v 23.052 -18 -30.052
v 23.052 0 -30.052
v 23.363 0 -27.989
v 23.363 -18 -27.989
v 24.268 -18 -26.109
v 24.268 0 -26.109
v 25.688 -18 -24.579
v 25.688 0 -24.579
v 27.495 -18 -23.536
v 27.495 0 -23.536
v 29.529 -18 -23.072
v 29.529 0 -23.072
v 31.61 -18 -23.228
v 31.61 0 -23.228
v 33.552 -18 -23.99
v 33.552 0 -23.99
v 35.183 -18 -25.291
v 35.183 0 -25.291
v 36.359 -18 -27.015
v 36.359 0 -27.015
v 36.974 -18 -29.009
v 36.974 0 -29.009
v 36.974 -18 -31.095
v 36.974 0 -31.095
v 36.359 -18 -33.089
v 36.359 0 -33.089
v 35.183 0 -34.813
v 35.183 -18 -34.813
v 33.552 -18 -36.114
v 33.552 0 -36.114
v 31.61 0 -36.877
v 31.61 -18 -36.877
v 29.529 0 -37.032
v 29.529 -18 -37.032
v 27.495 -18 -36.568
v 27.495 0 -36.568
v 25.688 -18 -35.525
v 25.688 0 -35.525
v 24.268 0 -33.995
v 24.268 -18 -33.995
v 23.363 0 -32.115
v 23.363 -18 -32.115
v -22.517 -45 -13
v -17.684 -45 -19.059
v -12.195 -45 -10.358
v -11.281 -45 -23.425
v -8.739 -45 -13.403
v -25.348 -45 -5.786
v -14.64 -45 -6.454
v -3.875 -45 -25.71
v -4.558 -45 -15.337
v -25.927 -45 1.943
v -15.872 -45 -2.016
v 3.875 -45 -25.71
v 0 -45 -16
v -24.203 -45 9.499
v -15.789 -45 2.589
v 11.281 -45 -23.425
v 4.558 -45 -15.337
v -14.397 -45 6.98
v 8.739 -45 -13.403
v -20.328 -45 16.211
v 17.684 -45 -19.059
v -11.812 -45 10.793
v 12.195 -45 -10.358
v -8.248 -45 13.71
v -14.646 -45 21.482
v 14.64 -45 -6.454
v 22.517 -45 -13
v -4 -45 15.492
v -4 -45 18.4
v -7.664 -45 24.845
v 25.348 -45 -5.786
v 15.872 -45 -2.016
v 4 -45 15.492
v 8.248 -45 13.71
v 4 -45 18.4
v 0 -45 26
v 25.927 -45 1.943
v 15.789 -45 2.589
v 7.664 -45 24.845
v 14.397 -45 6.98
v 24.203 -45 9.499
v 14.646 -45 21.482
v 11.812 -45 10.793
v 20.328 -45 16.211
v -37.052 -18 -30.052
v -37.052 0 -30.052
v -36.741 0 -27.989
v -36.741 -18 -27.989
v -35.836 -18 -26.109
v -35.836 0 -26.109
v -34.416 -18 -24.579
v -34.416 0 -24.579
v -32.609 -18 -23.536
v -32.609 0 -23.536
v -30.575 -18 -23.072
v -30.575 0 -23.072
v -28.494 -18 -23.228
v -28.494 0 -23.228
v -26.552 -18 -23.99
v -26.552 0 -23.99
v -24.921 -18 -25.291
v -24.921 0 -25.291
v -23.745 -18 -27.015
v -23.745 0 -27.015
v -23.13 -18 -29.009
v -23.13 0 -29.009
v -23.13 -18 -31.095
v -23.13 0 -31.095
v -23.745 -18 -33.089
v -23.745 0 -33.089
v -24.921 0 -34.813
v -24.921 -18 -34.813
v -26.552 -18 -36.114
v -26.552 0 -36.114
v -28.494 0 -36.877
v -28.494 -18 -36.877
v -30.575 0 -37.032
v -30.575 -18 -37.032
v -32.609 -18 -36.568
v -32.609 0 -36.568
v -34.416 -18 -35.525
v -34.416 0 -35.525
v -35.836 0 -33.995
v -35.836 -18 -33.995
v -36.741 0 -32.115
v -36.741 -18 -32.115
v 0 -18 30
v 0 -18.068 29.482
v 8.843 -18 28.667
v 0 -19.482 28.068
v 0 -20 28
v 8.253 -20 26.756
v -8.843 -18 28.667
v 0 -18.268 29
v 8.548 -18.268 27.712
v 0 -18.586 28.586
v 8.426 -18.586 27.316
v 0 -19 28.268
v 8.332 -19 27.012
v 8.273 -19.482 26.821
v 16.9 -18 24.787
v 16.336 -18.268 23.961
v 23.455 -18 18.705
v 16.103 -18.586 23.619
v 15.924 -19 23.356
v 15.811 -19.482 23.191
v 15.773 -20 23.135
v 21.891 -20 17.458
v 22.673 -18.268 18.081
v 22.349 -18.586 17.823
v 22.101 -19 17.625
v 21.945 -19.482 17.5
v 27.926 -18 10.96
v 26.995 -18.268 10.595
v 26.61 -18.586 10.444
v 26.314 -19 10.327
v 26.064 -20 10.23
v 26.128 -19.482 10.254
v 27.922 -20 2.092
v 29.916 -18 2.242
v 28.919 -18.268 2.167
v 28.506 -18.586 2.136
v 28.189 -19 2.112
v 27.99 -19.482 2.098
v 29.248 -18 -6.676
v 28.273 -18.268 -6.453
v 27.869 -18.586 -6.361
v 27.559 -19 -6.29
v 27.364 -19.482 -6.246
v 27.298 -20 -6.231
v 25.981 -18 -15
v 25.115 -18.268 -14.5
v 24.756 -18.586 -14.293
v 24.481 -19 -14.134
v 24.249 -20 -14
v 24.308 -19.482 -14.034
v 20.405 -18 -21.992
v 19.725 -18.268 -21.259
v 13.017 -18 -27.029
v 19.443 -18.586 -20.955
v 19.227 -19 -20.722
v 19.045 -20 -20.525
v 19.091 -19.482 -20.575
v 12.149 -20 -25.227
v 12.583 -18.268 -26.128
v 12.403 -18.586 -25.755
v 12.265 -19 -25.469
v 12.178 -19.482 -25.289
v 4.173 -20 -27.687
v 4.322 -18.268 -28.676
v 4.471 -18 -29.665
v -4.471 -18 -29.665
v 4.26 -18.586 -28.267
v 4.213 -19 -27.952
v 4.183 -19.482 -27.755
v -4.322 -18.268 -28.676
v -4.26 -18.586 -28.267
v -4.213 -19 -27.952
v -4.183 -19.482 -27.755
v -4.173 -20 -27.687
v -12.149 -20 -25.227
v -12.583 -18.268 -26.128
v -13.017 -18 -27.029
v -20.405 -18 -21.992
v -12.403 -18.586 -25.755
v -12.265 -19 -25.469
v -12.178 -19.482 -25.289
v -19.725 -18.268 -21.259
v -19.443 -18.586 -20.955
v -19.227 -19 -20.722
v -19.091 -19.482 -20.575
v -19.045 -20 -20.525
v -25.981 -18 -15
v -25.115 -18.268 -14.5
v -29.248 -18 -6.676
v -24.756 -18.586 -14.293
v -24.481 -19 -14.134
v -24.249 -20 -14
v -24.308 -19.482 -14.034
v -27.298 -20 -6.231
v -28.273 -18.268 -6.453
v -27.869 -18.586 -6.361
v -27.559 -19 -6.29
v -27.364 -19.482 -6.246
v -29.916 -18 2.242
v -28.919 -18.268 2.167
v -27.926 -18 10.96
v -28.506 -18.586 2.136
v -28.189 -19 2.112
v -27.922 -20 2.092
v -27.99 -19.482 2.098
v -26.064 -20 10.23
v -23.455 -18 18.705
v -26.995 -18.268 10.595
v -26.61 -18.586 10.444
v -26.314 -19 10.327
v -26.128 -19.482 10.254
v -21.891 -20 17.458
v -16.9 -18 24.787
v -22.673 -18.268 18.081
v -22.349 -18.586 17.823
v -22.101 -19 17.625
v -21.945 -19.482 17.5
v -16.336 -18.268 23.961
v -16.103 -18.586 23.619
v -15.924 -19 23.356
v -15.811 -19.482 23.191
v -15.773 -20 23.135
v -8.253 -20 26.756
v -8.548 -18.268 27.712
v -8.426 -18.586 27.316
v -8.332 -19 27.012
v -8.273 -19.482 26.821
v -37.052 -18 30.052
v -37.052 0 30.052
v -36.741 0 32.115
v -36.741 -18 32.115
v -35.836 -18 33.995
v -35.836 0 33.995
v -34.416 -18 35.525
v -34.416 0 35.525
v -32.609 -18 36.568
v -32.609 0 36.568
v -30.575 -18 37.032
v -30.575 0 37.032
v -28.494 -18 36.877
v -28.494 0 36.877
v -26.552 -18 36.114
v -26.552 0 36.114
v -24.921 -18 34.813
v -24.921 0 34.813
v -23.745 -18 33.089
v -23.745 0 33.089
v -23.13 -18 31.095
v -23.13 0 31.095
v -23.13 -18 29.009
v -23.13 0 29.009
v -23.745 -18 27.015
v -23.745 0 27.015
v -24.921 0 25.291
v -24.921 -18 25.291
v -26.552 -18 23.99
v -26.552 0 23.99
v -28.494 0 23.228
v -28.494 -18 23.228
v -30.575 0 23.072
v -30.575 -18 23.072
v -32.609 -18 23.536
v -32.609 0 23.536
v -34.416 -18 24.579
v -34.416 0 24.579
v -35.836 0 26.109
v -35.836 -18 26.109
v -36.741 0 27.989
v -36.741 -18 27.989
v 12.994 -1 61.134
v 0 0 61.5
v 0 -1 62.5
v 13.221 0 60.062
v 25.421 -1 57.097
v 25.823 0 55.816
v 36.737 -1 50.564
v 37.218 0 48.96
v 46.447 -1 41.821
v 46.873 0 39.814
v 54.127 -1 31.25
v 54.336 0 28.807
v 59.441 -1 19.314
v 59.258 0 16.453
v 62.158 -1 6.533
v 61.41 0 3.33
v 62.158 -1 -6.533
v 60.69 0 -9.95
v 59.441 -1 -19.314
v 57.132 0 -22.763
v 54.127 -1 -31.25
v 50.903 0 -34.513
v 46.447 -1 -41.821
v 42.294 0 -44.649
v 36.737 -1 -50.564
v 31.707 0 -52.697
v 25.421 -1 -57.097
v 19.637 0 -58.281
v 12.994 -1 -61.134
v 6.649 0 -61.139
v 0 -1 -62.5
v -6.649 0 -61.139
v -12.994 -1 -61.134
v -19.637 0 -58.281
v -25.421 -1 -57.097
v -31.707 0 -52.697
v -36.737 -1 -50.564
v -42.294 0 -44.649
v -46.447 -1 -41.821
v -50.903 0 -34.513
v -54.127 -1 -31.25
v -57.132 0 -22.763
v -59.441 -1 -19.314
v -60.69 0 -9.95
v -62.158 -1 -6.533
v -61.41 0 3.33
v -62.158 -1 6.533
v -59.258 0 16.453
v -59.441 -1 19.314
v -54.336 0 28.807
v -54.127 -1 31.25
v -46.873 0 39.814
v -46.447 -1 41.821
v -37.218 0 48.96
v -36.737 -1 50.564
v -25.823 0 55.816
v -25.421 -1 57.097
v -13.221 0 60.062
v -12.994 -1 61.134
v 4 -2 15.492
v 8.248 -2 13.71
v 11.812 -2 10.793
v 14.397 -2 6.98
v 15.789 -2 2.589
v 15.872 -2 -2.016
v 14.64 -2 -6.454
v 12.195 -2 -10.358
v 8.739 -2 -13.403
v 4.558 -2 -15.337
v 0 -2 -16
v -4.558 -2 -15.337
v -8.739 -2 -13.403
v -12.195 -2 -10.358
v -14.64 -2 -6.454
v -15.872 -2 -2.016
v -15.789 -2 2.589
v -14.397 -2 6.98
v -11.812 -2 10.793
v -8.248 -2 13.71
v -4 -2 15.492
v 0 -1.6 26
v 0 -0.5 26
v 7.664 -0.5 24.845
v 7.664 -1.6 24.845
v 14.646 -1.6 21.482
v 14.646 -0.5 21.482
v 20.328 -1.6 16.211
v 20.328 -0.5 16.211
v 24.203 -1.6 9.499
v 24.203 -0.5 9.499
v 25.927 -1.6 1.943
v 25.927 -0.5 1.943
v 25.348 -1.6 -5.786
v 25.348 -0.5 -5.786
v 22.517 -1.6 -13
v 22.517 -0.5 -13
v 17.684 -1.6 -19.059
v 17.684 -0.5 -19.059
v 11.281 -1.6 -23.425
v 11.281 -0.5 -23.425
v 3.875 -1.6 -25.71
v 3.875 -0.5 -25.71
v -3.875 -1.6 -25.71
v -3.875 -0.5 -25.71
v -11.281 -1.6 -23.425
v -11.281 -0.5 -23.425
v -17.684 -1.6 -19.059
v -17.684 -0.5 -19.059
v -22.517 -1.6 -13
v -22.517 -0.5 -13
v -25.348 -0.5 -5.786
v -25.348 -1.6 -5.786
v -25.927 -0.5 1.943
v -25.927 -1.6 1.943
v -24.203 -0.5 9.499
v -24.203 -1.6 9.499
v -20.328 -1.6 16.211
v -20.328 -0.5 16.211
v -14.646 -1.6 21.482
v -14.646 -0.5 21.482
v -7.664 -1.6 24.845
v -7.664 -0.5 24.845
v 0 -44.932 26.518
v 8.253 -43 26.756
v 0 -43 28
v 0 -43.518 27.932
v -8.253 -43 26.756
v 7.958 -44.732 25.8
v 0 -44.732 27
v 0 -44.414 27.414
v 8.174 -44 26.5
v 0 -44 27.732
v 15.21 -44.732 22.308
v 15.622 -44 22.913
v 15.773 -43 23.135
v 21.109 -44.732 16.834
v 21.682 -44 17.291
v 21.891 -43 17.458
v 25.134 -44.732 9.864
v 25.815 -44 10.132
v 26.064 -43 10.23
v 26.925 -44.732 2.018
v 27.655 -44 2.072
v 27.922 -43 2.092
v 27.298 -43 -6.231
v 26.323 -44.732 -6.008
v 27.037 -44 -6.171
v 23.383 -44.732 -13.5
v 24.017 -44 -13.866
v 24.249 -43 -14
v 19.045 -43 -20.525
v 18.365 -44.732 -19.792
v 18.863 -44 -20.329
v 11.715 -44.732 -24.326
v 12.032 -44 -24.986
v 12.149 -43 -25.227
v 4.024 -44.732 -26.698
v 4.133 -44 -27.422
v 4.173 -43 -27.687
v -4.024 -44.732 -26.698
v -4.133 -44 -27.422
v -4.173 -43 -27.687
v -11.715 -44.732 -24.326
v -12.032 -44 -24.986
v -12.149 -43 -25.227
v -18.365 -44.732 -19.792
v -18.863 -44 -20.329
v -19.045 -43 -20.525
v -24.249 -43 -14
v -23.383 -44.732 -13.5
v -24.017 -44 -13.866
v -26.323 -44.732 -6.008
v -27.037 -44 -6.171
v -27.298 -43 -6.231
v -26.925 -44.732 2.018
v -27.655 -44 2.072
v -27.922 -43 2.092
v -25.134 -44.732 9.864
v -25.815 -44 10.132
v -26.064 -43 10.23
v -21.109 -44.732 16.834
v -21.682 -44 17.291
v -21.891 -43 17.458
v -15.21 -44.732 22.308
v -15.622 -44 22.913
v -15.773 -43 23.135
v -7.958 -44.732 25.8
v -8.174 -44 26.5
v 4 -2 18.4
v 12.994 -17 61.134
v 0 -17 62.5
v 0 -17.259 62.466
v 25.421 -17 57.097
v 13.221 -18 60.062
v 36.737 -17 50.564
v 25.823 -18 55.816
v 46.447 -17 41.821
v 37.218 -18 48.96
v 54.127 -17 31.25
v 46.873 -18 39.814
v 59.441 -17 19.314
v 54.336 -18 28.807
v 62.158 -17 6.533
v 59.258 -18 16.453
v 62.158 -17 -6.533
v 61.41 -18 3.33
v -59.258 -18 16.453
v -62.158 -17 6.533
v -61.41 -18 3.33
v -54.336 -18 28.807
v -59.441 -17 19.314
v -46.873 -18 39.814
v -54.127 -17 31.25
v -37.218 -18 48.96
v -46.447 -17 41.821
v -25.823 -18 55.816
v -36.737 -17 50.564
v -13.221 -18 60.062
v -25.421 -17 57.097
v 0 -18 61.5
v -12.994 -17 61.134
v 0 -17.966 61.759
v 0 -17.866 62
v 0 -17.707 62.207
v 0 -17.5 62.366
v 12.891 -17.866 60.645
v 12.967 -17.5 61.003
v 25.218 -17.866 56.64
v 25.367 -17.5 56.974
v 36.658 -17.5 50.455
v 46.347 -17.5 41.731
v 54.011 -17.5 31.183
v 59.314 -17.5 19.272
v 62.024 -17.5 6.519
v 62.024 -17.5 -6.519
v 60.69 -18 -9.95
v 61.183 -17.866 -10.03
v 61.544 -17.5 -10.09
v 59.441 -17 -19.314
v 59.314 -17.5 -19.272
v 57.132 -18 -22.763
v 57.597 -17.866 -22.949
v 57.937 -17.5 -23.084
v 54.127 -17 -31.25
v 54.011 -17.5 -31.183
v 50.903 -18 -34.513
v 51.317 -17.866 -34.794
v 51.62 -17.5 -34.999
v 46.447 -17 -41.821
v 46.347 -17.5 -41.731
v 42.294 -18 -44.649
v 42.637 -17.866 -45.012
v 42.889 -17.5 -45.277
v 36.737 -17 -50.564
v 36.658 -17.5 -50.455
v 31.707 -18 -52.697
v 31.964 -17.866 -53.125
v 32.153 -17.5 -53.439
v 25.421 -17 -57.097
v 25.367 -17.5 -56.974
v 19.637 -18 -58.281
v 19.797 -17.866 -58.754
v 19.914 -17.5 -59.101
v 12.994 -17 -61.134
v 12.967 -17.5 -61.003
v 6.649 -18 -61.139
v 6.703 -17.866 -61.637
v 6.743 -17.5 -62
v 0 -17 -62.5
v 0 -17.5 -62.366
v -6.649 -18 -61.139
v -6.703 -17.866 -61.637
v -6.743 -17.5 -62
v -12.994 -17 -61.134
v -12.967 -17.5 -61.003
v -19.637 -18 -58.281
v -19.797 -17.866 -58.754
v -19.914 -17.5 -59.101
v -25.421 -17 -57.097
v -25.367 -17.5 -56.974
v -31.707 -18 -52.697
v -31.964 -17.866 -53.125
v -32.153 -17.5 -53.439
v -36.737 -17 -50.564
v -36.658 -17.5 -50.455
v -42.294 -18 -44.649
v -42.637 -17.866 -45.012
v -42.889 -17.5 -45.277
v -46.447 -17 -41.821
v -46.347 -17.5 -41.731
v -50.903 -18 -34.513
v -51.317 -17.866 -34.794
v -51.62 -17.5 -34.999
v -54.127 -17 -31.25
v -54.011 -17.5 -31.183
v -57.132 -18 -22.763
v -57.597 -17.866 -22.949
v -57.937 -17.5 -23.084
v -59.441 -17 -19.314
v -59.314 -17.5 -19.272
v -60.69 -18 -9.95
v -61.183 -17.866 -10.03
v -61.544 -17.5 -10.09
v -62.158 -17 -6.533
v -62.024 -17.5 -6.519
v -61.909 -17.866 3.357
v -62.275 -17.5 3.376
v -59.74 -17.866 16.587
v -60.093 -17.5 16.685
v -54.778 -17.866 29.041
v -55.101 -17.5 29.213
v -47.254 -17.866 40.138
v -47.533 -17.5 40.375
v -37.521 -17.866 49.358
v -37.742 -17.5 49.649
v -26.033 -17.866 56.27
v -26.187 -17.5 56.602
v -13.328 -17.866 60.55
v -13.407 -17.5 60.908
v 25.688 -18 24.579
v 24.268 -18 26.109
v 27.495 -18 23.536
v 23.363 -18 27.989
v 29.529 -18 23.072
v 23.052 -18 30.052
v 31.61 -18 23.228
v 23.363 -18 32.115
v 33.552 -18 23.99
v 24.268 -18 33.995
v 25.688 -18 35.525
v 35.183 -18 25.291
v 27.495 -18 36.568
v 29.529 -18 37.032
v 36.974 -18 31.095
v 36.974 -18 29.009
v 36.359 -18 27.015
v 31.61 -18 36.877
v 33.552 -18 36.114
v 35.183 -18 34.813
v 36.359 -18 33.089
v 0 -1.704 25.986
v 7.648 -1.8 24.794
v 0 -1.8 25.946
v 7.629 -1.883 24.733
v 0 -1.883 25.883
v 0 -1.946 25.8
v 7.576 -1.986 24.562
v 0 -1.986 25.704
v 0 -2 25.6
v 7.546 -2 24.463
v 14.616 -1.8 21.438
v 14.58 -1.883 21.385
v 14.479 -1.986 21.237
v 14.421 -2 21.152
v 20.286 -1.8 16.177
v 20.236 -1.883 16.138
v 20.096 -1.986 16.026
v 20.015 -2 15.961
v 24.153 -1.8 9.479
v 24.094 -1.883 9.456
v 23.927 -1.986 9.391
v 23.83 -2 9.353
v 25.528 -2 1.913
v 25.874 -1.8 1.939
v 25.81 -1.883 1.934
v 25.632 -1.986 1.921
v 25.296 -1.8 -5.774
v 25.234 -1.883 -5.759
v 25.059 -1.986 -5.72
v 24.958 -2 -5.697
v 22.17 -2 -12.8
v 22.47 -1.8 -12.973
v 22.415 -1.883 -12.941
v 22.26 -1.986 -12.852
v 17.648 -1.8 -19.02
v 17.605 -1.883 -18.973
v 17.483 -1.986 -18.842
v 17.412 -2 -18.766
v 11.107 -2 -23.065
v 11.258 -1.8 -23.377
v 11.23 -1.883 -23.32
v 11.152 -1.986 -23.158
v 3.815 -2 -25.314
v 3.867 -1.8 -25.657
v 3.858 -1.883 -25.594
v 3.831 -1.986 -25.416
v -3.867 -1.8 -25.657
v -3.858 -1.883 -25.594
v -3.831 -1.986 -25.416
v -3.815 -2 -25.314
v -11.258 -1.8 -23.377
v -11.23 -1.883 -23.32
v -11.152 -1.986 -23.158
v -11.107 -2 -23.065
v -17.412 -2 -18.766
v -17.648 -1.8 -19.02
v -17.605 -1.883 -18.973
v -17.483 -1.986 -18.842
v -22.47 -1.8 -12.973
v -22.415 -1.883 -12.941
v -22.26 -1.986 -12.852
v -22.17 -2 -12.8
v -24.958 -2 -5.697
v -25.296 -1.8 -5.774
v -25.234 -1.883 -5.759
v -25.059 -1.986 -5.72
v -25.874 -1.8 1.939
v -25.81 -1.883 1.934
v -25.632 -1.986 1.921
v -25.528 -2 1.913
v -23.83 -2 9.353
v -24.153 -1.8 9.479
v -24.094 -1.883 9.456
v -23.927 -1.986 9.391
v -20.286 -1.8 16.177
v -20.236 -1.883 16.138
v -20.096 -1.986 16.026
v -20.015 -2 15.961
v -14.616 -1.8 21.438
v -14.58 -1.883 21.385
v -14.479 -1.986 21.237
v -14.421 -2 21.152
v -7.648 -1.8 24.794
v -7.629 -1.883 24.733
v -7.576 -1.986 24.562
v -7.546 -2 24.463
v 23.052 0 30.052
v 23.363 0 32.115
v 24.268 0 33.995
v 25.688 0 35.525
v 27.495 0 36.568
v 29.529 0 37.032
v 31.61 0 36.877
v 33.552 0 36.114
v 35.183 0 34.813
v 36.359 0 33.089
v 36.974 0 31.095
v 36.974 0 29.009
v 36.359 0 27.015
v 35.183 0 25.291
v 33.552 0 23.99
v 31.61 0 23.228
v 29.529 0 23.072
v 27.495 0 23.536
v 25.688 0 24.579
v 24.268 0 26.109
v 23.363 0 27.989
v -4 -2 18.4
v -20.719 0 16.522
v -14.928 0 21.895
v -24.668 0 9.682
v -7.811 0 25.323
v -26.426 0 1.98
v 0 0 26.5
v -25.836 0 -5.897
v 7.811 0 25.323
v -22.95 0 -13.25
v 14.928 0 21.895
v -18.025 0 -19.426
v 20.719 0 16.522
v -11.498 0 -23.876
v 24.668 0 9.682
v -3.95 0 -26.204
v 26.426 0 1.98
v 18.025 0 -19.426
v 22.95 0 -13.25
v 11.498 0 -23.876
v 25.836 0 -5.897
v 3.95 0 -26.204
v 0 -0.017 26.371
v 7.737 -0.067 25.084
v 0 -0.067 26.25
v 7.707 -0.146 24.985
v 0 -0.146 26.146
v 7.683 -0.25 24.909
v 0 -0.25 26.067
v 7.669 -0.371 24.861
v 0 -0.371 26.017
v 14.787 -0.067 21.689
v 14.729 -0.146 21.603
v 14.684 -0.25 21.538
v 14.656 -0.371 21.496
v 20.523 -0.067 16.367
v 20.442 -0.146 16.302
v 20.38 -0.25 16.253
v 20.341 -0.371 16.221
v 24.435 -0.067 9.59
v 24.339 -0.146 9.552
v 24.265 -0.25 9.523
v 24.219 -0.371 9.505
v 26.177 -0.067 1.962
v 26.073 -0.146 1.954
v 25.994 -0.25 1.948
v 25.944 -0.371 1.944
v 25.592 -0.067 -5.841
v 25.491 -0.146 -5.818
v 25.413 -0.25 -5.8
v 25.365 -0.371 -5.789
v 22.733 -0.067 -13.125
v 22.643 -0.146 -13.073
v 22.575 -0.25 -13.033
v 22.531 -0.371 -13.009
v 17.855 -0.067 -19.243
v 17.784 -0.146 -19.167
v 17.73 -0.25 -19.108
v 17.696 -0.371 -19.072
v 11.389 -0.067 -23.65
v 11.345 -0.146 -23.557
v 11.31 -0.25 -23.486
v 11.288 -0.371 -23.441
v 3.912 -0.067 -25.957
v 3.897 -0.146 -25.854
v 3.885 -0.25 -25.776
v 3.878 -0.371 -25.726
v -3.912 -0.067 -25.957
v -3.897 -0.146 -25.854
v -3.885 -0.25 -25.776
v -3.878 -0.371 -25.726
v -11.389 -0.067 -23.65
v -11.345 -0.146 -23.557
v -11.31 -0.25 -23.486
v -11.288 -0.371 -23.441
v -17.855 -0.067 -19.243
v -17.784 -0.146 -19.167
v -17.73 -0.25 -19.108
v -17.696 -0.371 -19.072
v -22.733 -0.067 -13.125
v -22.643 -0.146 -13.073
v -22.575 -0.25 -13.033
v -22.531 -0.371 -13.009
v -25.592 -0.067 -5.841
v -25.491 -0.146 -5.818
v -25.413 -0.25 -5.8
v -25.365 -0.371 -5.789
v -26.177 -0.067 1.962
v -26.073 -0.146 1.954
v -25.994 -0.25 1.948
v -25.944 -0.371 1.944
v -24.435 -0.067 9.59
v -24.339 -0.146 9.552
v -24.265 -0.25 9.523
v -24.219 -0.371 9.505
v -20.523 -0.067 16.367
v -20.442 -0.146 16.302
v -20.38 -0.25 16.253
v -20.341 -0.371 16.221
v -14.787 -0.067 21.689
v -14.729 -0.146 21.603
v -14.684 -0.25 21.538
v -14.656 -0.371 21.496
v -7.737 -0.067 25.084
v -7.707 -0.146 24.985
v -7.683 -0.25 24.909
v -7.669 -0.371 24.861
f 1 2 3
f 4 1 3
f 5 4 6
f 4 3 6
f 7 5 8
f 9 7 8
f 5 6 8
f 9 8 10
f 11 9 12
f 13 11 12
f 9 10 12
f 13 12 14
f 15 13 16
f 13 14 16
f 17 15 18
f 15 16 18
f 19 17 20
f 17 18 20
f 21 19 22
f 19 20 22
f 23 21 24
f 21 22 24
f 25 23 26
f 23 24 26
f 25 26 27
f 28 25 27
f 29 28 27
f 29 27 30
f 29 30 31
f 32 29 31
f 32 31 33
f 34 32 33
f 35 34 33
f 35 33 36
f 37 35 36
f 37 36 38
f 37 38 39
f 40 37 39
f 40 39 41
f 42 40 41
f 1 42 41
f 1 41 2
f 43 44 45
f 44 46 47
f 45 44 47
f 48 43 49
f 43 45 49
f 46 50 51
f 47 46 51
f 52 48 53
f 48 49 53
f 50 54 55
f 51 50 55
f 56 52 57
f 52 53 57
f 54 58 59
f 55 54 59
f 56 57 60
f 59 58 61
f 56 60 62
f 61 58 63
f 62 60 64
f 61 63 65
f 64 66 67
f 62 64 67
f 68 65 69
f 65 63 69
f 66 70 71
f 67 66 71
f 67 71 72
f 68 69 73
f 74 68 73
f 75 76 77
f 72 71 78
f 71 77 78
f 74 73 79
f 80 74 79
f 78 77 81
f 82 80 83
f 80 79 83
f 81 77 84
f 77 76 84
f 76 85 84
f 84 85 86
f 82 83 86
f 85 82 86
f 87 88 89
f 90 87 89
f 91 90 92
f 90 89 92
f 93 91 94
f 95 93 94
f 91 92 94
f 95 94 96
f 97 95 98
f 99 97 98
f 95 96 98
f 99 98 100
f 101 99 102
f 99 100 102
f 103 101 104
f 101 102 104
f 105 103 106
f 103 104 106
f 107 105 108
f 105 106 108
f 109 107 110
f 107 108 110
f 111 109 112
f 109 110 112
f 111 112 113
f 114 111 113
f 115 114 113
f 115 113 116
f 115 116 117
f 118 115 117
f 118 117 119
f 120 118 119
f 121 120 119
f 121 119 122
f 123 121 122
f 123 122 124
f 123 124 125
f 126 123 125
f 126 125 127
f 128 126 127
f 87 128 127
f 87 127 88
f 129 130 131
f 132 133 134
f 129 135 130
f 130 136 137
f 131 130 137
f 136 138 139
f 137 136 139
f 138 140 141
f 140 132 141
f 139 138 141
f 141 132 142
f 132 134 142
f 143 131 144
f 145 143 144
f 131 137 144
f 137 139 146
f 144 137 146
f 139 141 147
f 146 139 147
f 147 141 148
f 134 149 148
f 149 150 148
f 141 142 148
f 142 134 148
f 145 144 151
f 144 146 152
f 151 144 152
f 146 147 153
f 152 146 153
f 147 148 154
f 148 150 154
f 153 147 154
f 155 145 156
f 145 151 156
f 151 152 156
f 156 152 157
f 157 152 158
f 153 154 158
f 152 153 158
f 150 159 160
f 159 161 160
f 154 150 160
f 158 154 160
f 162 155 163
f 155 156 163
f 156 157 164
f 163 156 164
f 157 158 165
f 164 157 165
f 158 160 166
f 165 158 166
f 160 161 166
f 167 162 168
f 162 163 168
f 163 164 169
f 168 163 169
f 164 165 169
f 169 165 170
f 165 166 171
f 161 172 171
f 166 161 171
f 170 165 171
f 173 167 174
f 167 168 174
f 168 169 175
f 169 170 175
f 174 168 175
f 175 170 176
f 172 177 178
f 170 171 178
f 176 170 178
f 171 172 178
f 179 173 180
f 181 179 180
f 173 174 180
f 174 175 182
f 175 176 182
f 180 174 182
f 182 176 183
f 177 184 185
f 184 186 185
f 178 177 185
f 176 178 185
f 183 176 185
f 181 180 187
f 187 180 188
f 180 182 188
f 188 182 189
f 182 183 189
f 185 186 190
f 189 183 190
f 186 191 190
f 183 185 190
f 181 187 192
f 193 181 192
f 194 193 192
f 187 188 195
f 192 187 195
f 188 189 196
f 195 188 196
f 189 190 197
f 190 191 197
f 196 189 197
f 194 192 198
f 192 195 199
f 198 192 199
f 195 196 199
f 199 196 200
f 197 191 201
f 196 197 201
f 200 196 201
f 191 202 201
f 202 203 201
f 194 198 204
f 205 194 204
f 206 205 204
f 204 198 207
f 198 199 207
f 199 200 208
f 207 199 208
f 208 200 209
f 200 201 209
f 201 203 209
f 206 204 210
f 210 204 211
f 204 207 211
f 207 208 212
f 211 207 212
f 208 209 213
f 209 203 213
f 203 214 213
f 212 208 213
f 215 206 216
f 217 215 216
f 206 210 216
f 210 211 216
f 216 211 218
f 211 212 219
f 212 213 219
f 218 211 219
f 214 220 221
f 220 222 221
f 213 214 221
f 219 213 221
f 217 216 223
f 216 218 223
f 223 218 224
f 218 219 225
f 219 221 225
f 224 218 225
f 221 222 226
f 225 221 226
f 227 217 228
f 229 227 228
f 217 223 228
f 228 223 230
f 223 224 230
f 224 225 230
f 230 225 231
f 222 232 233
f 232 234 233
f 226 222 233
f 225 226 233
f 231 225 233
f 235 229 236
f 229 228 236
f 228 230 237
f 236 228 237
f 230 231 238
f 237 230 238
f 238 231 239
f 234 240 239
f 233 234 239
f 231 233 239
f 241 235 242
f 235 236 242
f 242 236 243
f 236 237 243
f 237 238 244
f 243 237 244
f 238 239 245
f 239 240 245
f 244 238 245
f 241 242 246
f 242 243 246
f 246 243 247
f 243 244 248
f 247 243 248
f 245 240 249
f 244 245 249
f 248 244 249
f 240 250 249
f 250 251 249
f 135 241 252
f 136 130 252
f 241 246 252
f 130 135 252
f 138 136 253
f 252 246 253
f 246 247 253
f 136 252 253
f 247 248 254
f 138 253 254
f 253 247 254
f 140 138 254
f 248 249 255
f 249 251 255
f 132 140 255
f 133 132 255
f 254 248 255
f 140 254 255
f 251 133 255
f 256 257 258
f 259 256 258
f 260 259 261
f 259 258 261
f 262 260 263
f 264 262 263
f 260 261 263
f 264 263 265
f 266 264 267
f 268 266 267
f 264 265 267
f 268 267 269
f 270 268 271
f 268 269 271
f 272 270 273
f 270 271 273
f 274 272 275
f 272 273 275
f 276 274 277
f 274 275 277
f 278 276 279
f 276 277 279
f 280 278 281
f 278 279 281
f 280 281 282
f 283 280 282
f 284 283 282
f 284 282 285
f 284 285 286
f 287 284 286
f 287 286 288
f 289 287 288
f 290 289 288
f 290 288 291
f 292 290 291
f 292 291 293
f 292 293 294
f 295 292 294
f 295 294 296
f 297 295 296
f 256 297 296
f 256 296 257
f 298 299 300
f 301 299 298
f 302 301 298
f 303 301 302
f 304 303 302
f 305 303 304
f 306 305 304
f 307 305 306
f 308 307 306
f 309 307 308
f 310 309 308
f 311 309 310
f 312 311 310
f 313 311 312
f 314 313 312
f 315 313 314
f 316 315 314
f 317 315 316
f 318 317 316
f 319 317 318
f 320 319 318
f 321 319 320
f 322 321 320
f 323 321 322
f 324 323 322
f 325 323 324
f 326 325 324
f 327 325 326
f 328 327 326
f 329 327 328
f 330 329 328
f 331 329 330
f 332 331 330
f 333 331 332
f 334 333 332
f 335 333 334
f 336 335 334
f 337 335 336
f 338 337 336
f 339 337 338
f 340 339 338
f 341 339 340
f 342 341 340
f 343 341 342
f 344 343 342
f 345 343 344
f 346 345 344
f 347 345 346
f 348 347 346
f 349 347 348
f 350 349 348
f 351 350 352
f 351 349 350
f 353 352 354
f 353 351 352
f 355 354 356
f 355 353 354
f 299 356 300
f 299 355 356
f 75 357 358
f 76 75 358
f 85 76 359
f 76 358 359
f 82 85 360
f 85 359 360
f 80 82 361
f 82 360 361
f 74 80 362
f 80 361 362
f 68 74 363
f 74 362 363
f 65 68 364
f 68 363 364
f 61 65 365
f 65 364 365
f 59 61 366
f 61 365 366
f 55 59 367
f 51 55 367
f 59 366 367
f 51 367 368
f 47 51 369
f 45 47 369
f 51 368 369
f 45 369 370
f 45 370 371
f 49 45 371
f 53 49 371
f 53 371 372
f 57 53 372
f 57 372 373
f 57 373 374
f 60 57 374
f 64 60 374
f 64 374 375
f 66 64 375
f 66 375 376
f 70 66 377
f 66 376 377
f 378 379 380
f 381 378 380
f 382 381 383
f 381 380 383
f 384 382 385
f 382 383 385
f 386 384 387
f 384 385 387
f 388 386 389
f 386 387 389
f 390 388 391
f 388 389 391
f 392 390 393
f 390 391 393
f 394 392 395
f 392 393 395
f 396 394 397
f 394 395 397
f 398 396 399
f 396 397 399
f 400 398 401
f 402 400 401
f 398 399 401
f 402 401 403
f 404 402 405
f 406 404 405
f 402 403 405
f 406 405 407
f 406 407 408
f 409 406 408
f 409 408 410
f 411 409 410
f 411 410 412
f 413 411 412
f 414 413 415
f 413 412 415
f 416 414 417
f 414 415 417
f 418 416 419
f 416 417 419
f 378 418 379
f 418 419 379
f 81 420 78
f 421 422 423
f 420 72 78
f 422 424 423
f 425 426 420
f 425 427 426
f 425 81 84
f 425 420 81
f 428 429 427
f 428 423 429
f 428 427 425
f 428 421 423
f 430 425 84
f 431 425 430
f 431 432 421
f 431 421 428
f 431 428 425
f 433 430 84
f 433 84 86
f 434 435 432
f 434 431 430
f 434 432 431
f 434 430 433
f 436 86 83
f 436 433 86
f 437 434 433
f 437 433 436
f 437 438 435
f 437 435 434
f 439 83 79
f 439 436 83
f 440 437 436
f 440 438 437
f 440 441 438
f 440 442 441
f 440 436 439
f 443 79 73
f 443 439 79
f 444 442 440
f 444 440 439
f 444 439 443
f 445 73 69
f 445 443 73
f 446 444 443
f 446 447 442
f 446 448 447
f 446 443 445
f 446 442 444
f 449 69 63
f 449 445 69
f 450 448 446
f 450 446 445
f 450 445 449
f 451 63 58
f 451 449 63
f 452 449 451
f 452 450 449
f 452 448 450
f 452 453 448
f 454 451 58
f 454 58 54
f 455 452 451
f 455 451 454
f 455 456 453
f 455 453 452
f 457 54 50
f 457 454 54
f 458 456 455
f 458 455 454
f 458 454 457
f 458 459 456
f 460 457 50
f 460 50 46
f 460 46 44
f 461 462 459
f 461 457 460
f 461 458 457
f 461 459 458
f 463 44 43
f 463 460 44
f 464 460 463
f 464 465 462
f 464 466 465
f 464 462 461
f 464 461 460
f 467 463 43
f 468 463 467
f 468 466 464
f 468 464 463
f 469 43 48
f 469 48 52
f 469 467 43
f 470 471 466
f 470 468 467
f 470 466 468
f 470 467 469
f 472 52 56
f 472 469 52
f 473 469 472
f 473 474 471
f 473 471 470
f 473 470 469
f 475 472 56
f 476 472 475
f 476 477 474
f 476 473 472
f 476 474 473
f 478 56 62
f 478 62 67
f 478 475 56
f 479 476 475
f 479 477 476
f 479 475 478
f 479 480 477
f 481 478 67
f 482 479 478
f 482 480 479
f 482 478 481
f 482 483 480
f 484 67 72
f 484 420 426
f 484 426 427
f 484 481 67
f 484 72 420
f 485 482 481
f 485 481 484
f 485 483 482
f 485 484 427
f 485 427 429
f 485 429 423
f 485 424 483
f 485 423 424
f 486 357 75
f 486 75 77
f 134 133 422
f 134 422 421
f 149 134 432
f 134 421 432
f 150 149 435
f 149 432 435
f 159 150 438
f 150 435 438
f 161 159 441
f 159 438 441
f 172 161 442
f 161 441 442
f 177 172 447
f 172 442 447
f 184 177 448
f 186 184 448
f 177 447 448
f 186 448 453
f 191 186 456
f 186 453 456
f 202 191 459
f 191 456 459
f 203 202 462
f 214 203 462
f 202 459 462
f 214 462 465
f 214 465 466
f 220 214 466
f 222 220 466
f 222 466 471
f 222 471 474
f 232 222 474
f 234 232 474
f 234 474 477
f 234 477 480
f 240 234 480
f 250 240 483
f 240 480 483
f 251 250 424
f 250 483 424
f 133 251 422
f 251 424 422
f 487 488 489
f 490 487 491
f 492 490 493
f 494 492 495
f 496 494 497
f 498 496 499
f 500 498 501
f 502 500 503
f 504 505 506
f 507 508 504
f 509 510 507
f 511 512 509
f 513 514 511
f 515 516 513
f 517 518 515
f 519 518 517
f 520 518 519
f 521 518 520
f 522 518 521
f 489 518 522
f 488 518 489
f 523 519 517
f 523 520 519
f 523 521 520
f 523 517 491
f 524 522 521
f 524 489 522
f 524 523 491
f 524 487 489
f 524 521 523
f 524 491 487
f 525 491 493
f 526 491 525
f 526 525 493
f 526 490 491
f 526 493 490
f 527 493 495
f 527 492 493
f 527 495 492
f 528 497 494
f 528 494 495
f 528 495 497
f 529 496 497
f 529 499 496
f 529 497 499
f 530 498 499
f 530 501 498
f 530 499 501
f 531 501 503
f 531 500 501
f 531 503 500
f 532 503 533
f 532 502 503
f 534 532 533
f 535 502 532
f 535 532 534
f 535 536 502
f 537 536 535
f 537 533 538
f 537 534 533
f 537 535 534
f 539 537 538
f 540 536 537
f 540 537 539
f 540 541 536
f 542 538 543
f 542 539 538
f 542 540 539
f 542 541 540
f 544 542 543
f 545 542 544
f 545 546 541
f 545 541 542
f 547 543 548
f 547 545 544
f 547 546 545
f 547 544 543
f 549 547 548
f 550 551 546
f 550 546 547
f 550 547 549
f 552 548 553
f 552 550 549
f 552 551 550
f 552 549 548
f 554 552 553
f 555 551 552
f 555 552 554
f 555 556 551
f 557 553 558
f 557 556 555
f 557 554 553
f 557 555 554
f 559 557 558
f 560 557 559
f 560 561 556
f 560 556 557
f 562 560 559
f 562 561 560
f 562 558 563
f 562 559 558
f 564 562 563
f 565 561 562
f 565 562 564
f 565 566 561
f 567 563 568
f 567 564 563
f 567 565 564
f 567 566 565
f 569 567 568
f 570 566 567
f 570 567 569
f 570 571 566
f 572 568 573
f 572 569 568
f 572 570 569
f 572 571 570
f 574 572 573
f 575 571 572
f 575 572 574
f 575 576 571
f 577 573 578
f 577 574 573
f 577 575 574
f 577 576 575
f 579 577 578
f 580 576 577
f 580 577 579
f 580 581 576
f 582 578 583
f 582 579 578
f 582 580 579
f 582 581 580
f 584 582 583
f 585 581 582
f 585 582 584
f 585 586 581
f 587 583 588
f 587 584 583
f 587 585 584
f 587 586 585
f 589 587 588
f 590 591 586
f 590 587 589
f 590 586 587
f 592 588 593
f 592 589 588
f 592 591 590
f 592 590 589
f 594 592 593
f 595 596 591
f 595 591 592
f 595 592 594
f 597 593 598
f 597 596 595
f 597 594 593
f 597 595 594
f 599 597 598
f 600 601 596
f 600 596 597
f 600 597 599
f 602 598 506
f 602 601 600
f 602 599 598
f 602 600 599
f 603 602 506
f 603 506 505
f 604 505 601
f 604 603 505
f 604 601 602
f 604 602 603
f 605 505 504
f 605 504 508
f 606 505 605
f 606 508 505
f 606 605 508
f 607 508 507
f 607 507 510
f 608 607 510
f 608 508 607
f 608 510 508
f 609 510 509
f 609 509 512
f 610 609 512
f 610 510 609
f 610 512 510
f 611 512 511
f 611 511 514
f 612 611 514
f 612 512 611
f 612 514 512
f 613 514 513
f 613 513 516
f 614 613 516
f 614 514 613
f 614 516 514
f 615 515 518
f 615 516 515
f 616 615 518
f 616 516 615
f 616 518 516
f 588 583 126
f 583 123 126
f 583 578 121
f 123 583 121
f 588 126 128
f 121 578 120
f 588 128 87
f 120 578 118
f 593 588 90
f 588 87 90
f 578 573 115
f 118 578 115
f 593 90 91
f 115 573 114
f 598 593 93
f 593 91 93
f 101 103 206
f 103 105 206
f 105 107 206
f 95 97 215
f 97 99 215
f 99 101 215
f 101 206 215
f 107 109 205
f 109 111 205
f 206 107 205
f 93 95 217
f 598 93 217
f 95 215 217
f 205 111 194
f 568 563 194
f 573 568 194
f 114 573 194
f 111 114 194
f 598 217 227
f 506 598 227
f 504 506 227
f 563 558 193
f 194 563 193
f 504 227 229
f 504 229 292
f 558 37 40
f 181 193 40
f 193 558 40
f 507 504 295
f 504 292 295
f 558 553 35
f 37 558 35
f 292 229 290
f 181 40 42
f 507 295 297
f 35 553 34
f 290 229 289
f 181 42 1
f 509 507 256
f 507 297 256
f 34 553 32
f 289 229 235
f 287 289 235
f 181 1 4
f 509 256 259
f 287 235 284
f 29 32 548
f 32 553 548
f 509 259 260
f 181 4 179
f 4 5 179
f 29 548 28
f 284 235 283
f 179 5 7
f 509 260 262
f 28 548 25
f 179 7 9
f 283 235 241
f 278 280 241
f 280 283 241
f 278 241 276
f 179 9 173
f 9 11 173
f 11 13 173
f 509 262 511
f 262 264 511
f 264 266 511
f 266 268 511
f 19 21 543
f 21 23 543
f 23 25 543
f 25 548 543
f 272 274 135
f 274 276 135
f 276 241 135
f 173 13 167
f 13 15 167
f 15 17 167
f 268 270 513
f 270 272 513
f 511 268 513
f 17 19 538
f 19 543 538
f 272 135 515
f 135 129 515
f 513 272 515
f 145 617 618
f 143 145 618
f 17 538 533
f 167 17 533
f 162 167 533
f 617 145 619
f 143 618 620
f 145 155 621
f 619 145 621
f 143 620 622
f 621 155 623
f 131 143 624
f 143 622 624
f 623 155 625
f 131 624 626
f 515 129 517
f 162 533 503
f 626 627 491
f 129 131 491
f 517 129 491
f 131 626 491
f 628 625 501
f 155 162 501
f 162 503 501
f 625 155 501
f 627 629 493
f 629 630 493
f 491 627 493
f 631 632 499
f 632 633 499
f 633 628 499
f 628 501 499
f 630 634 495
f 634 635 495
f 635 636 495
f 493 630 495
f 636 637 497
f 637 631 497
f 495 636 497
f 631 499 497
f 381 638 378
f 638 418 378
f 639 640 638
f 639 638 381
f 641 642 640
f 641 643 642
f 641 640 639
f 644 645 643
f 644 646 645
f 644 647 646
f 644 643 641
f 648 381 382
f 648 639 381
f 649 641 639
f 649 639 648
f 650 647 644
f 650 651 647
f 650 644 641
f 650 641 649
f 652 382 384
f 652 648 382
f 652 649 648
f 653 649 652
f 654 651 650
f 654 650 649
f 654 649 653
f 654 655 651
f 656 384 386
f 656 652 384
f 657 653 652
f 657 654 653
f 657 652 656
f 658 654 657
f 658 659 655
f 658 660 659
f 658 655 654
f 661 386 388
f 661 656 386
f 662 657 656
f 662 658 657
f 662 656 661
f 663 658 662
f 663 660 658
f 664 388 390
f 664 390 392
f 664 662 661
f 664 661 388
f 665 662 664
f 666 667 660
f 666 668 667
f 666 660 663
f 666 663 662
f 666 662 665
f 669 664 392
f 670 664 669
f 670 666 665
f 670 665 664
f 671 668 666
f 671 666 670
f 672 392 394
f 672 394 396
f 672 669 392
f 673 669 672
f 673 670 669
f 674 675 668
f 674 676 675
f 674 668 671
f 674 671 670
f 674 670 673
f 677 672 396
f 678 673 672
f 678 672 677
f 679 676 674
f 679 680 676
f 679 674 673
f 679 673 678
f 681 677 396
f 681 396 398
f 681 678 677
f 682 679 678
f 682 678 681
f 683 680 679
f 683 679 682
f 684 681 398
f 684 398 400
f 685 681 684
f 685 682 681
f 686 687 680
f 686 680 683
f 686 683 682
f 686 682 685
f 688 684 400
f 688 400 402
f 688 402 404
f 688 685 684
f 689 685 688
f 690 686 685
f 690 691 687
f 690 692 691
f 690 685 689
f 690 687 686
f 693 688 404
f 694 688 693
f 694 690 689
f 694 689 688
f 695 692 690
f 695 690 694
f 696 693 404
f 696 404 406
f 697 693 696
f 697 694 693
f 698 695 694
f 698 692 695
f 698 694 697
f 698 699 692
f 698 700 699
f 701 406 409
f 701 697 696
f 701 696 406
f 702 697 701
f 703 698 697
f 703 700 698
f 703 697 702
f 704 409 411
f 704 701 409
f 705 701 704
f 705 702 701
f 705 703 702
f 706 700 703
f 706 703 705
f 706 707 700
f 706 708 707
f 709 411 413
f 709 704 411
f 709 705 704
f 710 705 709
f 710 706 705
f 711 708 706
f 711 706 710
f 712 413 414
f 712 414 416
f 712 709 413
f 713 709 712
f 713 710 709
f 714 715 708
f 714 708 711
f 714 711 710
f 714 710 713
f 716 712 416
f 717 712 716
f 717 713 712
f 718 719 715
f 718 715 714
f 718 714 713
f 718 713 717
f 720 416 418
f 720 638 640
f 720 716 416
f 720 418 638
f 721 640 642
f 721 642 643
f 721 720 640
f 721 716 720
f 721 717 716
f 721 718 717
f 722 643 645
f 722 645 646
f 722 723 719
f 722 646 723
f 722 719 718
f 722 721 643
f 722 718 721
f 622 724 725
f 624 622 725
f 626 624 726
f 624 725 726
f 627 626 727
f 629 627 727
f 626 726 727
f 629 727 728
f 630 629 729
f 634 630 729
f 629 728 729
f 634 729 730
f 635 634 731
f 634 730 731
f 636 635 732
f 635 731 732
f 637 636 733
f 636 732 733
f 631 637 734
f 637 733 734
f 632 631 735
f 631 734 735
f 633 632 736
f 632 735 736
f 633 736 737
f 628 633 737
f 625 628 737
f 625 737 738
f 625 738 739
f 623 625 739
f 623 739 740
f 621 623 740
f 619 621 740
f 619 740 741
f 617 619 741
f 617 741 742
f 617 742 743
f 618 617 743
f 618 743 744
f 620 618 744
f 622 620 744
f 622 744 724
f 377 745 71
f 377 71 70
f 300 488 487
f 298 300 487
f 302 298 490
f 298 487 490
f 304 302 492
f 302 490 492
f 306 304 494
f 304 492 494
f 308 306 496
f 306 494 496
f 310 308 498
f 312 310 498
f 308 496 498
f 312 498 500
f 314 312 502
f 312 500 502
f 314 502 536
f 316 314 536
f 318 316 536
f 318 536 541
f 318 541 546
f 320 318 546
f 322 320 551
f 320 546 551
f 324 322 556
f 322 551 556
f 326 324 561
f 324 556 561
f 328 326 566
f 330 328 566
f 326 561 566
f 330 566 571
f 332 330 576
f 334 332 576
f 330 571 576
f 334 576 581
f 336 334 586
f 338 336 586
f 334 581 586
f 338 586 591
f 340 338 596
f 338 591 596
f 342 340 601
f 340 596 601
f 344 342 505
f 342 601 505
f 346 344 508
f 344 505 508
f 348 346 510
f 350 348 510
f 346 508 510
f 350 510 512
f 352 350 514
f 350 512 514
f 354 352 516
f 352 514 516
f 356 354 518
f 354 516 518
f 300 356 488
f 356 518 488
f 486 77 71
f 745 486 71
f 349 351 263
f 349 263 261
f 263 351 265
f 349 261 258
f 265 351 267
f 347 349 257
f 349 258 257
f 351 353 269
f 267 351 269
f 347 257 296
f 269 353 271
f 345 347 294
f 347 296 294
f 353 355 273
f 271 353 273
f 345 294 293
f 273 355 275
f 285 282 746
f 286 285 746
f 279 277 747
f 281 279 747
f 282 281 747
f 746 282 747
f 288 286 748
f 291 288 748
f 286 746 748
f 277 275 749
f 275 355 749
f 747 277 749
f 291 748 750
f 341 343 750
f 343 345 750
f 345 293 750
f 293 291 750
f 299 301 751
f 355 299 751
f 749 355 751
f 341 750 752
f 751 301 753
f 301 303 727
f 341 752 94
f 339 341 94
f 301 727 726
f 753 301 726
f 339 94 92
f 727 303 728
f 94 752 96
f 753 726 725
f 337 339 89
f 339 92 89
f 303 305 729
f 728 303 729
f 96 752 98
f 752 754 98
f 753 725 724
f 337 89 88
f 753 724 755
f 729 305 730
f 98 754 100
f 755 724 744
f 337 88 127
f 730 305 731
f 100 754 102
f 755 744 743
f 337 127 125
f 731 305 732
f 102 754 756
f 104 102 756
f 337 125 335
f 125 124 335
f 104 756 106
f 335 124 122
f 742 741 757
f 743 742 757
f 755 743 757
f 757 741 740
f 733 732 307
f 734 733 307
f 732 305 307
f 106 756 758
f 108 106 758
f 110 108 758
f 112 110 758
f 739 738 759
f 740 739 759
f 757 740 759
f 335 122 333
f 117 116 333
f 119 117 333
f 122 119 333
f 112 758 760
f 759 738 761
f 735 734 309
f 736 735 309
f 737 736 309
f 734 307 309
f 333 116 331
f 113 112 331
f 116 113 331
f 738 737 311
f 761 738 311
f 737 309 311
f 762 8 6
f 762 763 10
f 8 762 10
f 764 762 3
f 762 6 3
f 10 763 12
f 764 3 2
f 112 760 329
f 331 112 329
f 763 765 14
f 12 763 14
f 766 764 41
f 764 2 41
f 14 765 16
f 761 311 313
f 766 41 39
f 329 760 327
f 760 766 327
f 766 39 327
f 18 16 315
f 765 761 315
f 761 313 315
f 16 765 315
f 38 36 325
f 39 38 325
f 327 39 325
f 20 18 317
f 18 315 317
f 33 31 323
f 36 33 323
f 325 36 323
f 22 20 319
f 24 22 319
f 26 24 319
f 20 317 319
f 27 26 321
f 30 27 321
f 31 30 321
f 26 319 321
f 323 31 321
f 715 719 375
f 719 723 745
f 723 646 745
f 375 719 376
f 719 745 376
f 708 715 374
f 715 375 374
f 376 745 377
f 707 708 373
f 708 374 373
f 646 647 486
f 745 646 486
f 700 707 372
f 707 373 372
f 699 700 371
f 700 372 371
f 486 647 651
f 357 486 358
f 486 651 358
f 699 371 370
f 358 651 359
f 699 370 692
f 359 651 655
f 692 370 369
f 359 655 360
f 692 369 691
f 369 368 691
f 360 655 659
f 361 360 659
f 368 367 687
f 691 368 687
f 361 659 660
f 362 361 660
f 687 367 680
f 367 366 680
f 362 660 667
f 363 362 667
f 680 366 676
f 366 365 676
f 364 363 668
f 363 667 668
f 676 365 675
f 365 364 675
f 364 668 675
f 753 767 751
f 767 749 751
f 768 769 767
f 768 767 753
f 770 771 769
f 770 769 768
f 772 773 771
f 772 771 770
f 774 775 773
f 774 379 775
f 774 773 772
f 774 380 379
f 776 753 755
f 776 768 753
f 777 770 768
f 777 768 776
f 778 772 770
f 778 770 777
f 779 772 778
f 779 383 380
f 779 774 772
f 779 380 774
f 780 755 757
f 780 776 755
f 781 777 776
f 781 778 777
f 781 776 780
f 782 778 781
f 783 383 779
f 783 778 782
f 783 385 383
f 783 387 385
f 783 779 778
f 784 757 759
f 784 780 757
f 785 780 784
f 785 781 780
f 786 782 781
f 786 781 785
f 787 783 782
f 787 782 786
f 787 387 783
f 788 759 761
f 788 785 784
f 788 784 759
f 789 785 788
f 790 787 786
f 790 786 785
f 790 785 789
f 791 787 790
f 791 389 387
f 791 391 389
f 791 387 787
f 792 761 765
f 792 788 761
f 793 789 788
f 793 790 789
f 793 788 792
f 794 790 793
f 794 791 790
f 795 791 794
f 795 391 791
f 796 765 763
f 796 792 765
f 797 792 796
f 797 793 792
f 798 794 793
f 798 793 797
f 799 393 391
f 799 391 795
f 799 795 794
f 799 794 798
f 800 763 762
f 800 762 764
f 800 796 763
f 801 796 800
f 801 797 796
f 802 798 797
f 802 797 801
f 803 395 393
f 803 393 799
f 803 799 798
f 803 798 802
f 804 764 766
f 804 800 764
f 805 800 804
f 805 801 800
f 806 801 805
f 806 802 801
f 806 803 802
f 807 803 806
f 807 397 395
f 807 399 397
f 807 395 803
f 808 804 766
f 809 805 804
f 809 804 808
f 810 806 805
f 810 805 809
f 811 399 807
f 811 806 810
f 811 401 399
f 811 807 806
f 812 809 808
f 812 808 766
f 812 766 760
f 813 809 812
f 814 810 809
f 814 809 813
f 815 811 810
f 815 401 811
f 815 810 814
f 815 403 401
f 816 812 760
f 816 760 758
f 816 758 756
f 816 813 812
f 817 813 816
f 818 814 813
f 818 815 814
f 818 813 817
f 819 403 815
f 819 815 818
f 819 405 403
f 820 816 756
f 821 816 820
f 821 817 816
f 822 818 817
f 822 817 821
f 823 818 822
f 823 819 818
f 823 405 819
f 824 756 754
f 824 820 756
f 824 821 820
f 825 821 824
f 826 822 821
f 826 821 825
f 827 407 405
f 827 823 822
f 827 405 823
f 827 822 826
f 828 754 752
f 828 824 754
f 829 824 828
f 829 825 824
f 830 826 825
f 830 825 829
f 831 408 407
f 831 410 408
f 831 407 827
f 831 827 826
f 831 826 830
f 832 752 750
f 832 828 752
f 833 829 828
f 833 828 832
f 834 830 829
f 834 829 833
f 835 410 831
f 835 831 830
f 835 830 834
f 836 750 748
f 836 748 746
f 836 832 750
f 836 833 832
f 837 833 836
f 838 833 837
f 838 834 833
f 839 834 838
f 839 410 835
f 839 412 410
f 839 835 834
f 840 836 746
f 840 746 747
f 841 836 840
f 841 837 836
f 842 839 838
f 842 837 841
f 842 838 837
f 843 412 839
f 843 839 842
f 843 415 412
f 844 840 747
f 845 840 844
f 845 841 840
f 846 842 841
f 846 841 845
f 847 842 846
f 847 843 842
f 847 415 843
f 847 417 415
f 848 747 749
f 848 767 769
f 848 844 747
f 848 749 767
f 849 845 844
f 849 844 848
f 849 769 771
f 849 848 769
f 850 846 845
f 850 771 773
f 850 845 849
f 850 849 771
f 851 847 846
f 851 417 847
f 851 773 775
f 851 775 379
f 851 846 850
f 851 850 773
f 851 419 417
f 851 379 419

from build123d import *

# Parameters (mm, degrees)
F3_DEPTH = 45.001
F5_D     = 14
F6_R     = 2
F7_R     = 1
F8_SIZE  = 1
F9_R     = 0.5
F10_R    = 0.4


with BuildPart() as f1:
    # F0 (on Right) → F1 (revolve)
    with BuildSketch(Plane.YZ):
        Polygon((-2, 26), (0, 26), (0, 62.5), (-18, 62.5), (-18, 28), (-45, 28), (-45, 16), (-2, 16), align=None)
    revolve(axis=Axis((0, -22.398166, 0), (0, 1, 0)))

    # F2 (on face) → F3 (cut, through all)
    with BuildSketch(Plane.XZ.offset(45)):
        with BuildLine():
            ThreePointArc((4, 15.491933), (0, 16), (-4, 15.491933))
            Line((-4, 15.491933), (-4, 12))
            Line((-4, 12), (4, 12))
            Line((4, 12), (4, 15.491933))
        make_face()
        with BuildLine():
            Line((4, 18.4), (-4, 18.4))
            Line((-4, 18.4), (-4, 15.491933))
            ThreePointArc((-4, 15.491933), (0, 16), (4, 15.491933))
            Line((4, 15.491933), (4, 18.4))
        make_face()
    extrude(amount=-F3_DEPTH, mode=Mode.SUBTRACT)

    # F5 (through all)
    with Locations(Plane.XZ.offset(18)):
        with Locations((30.052038, 30.052038), (30.052038, -30.052038), (-30.052038, -30.052038), (-30.052038, 30.052038)):
            Hole(F5_D / 2)

    # F6
    f6_edges = [f1.edges().sort_by_distance(p)[0] for p in [
        (0, -18, -28),
        (0, -45, -28),
    ]]
    fillet(f6_edges, radius=F6_R)

    # F7
    f7_edges = [f1.edges().sort_by_distance(p)[0] for p in [
        (0, -18, -62.5),
    ]]
    fillet(f7_edges, radius=F7_R)

    # F8
    f8_edges = [f1.edges().sort_by_distance(p)[0] for p in [
        (0, 0, -62.5),
    ]]
    chamfer(f8_edges, length=F8_SIZE)

    # F9
    f9_edges = [f1.edges().sort_by_distance(p)[0] for p in [
        (0, 0, -26),
    ]]
    fillet(f9_edges, radius=F9_R)

    # F10
    f10_edges = [f1.edges().sort_by_distance(p)[0] for p in [
        (0, -2, -26),
    ]]
    fillet(f10_edges, radius=F10_R)


solid = f1.part
